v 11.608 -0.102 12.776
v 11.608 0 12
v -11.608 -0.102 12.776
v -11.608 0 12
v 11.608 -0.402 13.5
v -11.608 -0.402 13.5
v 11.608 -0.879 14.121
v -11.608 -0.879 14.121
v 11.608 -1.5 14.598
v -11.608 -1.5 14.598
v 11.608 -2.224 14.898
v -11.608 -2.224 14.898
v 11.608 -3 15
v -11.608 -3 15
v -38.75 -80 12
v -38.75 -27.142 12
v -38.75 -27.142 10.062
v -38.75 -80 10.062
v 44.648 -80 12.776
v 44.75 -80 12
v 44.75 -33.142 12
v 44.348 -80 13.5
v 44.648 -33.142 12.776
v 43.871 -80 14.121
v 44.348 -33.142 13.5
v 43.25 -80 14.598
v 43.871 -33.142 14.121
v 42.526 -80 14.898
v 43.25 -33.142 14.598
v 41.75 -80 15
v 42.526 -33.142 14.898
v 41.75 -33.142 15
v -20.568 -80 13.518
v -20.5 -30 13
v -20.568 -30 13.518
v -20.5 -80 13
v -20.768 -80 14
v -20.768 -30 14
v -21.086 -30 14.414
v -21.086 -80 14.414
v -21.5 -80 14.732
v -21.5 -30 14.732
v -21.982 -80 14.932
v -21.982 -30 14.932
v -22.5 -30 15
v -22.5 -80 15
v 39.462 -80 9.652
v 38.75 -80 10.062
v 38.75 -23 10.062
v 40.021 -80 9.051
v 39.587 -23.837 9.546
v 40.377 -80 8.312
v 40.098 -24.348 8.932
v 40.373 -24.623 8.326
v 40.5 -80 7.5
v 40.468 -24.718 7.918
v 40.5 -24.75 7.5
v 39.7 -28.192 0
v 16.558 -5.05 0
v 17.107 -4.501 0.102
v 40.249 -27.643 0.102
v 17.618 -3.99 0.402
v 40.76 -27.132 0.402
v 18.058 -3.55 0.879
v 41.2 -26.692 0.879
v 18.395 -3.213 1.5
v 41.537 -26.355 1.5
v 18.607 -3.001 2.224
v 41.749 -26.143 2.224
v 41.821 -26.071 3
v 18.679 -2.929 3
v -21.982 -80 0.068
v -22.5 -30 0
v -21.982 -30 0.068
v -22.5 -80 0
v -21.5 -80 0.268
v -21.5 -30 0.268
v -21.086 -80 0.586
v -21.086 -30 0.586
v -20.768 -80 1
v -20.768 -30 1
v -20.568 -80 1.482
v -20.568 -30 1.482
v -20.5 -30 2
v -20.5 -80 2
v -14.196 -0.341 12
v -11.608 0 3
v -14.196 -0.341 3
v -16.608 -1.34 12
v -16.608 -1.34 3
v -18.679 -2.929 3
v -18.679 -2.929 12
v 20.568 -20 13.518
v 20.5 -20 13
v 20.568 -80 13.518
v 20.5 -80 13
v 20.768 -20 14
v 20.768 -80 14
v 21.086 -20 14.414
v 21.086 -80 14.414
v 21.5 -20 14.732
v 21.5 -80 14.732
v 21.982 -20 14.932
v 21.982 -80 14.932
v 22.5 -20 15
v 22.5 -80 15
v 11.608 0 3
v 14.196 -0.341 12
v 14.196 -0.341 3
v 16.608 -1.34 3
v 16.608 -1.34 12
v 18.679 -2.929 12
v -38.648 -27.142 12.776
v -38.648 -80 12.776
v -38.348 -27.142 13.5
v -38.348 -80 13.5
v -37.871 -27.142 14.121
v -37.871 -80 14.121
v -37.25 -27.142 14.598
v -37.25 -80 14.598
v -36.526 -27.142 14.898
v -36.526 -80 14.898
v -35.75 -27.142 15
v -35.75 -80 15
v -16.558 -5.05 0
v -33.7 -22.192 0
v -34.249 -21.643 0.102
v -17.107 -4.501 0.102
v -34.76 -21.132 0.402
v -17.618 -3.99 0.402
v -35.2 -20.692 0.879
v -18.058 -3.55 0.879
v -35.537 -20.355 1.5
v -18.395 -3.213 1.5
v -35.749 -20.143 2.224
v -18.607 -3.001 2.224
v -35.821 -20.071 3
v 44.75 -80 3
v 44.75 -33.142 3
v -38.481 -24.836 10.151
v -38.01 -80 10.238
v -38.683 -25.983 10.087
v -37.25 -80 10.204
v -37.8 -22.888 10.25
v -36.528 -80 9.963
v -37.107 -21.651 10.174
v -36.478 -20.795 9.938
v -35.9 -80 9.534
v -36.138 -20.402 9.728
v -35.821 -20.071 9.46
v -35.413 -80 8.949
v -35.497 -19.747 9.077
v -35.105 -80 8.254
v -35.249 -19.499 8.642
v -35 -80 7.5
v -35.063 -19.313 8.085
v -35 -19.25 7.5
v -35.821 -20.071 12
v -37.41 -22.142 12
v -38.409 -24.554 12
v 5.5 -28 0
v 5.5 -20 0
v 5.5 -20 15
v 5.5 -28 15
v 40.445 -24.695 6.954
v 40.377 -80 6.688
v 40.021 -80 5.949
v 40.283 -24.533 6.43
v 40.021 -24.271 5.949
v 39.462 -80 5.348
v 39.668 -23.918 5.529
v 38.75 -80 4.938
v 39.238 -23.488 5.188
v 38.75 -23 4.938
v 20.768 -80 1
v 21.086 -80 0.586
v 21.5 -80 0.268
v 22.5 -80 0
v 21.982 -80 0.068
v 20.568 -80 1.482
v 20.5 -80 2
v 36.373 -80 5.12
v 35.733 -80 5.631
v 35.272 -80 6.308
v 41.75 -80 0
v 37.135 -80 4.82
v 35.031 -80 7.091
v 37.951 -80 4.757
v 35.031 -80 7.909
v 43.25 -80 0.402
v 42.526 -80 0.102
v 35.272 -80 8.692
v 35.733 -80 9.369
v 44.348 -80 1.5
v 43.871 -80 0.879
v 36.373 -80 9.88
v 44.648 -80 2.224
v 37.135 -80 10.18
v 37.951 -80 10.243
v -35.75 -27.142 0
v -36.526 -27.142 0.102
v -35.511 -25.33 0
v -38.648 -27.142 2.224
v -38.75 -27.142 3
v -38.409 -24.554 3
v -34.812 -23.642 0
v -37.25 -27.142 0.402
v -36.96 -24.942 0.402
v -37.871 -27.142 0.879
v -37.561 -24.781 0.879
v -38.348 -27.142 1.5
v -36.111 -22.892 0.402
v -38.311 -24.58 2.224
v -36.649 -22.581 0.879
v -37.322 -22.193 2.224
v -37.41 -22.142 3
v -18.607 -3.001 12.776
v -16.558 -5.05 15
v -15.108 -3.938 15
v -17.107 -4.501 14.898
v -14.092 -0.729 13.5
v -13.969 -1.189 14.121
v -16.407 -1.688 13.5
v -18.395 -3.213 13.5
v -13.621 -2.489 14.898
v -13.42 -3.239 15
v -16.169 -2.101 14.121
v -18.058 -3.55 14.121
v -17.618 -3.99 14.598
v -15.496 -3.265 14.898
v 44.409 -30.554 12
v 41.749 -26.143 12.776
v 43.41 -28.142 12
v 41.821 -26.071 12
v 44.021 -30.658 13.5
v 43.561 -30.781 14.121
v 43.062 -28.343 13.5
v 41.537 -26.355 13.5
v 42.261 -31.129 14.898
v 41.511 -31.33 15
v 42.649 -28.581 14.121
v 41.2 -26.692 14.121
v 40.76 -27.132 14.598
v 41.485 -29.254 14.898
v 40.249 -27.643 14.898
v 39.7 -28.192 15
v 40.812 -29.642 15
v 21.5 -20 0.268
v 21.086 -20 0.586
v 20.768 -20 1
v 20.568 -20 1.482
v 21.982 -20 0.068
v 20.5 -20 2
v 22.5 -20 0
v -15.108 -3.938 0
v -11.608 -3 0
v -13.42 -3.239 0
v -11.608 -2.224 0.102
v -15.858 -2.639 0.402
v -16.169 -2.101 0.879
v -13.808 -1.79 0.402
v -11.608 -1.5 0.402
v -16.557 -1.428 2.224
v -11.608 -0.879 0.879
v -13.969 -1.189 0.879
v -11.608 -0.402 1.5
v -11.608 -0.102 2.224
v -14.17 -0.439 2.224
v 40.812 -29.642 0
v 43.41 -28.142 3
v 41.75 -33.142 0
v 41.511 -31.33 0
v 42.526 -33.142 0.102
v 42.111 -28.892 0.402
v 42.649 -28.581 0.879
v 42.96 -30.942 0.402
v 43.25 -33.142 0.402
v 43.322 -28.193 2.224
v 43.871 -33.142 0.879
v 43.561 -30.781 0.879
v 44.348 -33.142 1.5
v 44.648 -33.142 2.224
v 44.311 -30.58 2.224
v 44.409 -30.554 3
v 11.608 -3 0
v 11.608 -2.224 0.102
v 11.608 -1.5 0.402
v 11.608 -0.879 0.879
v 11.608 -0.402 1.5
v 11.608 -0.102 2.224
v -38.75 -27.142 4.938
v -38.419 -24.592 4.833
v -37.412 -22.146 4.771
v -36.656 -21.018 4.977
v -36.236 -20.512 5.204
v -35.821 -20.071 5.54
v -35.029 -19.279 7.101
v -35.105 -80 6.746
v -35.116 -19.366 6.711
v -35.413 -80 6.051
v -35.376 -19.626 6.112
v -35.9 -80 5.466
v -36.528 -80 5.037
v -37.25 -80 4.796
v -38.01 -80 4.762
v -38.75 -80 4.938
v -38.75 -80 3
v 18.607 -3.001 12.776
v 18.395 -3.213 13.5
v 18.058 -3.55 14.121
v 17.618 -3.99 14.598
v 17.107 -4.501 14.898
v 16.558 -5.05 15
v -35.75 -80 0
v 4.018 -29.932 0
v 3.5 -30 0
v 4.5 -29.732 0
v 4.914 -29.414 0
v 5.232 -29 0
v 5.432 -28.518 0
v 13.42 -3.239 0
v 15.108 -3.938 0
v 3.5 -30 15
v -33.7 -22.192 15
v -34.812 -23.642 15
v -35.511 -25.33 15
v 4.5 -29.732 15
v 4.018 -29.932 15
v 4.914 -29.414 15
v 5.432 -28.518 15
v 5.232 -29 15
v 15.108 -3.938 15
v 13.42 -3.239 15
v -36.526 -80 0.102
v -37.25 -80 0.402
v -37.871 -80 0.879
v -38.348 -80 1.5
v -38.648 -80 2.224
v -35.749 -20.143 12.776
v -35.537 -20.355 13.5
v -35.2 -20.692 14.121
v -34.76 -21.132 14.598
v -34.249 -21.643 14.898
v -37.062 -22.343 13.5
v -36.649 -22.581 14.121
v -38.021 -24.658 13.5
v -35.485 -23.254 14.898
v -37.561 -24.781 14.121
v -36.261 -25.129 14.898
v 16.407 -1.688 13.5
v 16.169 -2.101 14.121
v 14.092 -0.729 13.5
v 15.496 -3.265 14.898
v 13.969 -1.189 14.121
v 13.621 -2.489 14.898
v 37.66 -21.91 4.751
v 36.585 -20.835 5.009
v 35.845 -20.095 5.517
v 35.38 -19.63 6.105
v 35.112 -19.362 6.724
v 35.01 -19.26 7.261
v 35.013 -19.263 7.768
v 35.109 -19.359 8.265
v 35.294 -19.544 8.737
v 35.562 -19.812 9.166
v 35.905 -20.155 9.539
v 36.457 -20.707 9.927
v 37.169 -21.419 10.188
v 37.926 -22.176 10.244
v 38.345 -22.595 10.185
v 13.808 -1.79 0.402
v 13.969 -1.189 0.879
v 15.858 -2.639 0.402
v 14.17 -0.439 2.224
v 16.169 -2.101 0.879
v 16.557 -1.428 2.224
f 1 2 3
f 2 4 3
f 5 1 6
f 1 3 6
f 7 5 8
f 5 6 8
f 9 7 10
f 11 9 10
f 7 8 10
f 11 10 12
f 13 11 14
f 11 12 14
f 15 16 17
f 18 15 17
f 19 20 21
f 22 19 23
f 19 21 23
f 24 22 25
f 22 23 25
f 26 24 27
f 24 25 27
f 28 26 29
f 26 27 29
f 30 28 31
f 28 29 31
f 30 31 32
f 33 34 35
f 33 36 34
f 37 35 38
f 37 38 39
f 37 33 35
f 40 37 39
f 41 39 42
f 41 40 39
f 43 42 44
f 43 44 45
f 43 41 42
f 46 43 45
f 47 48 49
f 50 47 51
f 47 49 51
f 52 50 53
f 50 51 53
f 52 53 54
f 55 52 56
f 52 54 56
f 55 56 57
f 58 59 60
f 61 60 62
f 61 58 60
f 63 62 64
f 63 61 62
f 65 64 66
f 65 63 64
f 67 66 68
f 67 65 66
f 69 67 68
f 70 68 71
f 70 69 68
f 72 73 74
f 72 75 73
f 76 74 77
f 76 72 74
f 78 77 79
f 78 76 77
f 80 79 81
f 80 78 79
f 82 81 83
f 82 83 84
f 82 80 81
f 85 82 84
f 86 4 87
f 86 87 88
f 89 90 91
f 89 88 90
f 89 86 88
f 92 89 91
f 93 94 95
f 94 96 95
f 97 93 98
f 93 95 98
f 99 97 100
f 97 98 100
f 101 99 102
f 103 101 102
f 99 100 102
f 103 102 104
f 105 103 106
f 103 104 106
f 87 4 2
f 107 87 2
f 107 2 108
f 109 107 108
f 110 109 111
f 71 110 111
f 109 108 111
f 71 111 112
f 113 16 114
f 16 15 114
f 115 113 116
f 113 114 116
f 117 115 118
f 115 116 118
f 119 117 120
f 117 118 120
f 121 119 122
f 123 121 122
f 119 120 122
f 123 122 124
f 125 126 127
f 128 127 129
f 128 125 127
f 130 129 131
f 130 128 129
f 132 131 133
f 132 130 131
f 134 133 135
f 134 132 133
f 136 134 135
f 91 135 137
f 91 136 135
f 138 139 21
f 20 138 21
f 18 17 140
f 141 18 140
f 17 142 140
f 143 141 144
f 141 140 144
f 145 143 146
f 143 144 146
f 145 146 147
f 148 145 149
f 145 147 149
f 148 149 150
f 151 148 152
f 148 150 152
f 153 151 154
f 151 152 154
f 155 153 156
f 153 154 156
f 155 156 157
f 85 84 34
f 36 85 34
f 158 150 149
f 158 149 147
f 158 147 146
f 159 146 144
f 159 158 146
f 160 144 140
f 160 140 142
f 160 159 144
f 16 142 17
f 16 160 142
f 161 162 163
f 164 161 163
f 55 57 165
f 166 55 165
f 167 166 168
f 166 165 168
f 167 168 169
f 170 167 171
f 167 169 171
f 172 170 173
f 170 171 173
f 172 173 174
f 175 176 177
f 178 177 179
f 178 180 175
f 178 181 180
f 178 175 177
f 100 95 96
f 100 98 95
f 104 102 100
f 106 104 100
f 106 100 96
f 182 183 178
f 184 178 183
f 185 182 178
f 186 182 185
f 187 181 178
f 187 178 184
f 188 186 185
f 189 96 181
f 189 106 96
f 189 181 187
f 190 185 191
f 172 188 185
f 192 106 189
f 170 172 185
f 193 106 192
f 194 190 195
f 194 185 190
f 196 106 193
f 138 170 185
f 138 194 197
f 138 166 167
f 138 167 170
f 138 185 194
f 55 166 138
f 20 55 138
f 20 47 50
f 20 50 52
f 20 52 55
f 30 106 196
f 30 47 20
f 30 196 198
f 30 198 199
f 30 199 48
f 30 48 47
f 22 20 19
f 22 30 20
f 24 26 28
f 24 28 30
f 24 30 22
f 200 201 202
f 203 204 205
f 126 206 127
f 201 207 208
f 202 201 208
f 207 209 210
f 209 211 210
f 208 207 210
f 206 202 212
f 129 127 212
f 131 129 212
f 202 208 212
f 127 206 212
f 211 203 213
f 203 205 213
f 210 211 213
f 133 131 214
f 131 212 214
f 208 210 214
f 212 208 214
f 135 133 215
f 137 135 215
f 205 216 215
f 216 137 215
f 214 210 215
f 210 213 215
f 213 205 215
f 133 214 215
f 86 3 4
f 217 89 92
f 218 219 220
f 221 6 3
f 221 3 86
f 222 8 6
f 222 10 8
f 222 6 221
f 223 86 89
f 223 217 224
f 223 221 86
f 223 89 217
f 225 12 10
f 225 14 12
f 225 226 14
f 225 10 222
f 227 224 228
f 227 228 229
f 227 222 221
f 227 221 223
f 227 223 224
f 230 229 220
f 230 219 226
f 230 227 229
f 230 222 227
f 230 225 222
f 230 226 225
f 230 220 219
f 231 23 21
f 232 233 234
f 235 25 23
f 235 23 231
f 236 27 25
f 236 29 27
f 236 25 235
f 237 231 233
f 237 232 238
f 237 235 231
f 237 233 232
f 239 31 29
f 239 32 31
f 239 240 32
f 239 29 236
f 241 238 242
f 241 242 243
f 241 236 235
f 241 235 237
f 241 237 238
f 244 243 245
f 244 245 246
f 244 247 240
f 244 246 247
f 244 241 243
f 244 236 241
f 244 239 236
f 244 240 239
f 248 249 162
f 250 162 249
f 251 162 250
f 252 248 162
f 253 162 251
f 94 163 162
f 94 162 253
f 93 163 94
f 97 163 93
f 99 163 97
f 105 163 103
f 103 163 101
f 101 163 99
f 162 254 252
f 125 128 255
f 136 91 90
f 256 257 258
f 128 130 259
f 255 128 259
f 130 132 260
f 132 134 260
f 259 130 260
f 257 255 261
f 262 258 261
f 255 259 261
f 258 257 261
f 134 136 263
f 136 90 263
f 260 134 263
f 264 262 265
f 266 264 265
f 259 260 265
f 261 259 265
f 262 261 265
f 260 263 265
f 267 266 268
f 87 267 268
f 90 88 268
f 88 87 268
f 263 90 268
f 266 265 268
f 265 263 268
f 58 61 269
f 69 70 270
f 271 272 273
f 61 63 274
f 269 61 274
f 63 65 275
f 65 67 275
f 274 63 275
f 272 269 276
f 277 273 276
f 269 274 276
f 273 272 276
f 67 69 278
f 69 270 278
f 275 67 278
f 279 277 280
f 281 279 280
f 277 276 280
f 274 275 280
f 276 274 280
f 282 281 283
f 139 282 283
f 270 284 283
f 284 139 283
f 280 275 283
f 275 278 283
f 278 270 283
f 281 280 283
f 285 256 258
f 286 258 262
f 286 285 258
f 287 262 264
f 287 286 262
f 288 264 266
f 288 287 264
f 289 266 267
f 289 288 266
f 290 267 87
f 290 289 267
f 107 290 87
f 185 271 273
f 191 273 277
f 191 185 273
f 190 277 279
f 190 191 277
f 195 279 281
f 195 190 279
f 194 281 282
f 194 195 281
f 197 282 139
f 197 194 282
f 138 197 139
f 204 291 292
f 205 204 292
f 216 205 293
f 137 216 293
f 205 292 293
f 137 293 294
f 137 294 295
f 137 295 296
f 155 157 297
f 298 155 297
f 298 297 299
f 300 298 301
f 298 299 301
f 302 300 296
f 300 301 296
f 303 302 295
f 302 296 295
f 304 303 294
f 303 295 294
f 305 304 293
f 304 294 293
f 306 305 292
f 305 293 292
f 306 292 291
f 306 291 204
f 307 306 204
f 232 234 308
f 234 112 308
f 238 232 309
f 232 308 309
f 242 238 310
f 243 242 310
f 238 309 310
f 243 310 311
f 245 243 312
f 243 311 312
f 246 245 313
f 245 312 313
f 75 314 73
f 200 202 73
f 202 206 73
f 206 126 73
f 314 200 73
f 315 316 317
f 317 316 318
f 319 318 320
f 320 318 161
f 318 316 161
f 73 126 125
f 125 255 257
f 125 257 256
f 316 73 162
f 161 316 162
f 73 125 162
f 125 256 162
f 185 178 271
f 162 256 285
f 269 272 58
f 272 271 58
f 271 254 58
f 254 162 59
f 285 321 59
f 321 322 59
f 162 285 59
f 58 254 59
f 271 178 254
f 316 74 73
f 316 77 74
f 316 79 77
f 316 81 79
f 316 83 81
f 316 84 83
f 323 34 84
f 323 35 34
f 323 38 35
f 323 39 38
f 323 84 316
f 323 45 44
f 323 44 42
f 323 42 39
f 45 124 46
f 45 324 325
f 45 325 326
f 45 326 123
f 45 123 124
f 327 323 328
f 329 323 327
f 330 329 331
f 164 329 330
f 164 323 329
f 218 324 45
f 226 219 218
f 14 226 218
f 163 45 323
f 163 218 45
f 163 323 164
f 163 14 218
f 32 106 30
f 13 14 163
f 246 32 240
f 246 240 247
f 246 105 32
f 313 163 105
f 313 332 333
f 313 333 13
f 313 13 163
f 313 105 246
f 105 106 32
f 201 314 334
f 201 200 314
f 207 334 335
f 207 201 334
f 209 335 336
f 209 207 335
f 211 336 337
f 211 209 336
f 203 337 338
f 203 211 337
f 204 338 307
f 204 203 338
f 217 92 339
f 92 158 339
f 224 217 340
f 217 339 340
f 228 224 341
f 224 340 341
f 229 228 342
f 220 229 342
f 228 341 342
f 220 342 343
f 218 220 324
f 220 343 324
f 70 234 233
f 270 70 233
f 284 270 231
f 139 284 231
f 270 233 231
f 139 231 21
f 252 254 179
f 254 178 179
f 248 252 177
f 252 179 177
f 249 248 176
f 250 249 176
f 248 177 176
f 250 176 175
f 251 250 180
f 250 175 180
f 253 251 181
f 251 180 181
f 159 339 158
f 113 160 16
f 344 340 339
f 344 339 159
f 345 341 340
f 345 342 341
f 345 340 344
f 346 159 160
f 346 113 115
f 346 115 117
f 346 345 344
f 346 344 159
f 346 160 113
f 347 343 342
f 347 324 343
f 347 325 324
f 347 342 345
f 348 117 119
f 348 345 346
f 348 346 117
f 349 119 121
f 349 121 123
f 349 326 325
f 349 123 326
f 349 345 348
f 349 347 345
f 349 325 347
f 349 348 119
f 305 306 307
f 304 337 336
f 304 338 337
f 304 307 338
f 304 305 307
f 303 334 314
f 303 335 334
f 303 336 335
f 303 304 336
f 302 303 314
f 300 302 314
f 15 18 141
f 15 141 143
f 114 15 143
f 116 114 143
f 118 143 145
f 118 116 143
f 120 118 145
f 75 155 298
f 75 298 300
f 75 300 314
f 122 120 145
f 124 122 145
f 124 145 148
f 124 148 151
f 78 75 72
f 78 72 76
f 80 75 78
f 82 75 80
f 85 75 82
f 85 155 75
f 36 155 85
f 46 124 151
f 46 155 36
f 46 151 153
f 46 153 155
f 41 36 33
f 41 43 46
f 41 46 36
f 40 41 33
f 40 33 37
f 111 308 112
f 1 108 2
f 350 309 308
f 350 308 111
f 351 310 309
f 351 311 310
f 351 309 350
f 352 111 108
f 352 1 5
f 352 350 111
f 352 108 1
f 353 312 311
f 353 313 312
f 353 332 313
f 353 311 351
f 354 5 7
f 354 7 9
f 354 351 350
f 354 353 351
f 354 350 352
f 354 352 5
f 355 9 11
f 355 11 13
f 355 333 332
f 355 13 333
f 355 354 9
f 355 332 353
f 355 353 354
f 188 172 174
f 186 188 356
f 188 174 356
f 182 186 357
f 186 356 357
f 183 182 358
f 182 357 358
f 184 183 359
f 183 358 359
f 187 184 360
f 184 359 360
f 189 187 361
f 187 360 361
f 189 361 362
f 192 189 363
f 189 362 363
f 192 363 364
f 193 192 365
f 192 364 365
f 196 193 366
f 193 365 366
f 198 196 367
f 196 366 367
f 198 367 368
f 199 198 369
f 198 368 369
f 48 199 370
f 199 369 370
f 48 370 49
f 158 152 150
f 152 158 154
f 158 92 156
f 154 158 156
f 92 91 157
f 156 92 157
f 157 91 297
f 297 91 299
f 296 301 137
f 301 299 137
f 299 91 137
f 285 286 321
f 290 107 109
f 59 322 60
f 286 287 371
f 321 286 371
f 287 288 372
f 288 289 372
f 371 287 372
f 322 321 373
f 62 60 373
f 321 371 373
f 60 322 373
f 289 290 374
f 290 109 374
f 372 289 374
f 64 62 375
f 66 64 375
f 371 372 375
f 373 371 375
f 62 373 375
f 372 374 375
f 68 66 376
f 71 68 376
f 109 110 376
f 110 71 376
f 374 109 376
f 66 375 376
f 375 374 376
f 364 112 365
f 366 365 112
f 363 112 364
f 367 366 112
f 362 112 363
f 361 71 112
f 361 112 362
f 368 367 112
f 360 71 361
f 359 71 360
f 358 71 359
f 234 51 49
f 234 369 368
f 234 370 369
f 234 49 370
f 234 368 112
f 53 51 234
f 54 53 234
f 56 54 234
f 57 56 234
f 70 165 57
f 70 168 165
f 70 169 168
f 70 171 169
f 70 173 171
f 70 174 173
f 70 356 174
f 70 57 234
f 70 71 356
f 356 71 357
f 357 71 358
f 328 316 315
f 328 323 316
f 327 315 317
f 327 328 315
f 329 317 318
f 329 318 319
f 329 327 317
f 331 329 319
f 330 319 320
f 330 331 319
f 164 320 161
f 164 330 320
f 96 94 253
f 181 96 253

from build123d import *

# Parameters (mm, degrees)
F1_DEPTH    = 80
F0_W        = 20.5
F0_H        = 15
F0_W_2      = 5.5
F2_DEPTH    = 30
F0_W_3      = 15
F3_DEPTH    = 20
F4_T1_DEPTH = 123.2356797549
F4_T3_DEPTH = 123.2356797549
F5_T1_DEPTH = 164.157613302
F6_R        = 10
F7_R        = 2
F8_R        = 3


# Not quite as in the source:
# - a fillet or chamfer that OpenCascade refuses, or shapes differently, is made with other operations: its cross-section is extruded or revolved along the edge and cut away or added


with BuildPart() as f1:
    # F0 (on Front) → F1 (new body)
    with BuildSketch(Plane.XZ):
        with BuildLine():
            Line((-20.5, 15), (-38.75, 15))
            Line((-38.75, 15), (-38.75, 10.0617376915))
            ThreePointArc((-38.75, 10.0617376915), (-36.1987907943, 9.7707377656), (-35, 7.5))
            ThreePointArc((-35, 7.5), (-36.1987907943, 5.2292622344), (-38.75, 4.9382623085))
            Line((-38.75, 4.9382623085), (-38.75, 0))
            Line((-38.75, 0), (-20.5, 0))
            Line((-20.5, 0), (-20.5, 15))
        make_face()
    extrude(amount=F1_DEPTH)

    # F0 (on Front) → F2 (join)
    with BuildSketch(Plane.XZ):
        with Locations((-10.25, 7.5)):
            Rectangle(F0_W, F0_H)
        with Locations((2.75, 7.5)):
            Rectangle(F0_W_2, F0_H)
    extrude(amount=F2_DEPTH)



with BuildPart() as f1b:
    # F0 (on Front) → F1, piece 2 (new body)
    with BuildSketch(Plane.XZ):
        with BuildLine():
            Line((38.75, 15), (20.5, 15))
            Line((20.5, 15), (20.5, 0))
            Line((20.5, 0), (38.75, 0))
            Line((38.75, 0), (38.75, 4.9382623085))
            ThreePointArc((38.75, 4.9382623085), (35, 7.5), (38.75, 10.0617376915))
            Line((38.75, 10.0617376915), (38.75, 15))
        make_face()
        with BuildLine():
            Line((44.75, 15), (38.75, 15))
            Line((38.75, 15), (38.75, 10.0617376915))
            ThreePointArc((38.75, 10.0617376915), (40.0207377656, 9.0512092057), (40.5, 7.5))
            ThreePointArc((40.5, 7.5), (40.0207377656, 5.9487907943), (38.75, 4.9382623085))
            Line((38.75, 4.9382623085), (38.75, 0))
            Line((38.75, 0), (44.75, 0))
            Line((44.75, 0), (44.75, 15))
        make_face()
    extrude(amount=F1_DEPTH)


with BuildPart() as f1_1:
    add(f1.part)

    add(f1b.part)  # F3 merges F1b
    # F0 (on Front) → F3 (join)
    with BuildSketch(Plane.XZ):
        with Locations((13, 7.5)):
            Rectangle(F0_W_3, F0_H)
    extrude(amount=F3_DEPTH)

    # F4: chamfer of 23 on 2 edges, made by hand

    # F4_s2 → F4_t1 (cut)
    with BuildSketch(Plane.XY.offset(-59.1487087232)):
        Polygon((-15.75, 0), (-38.75, -23), (-38.75, 0), align=None)
    extrude(amount=F4_T1_DEPTH, mode=Mode.SUBTRACT)

    # F4_s4 → F4_t3 (cut)
    with BuildSketch(Plane.XY.offset(-49.0869710317)):
        Polygon((-15.75, 0), (-38.75, -23), (-38.75, 0), align=None)
    extrude(amount=F4_T3_DEPTH, mode=Mode.SUBTRACT)

    # F5: chamfer of 29 on 1 edges, made by hand

    # F5_s2 → F5_t1 (cut)
    with BuildSketch(Plane.XY.offset(-74.578806651)):
        Polygon((15.75, 0), (44.75, -29), (44.75, 0), align=None)
    extrude(amount=F5_T1_DEPTH, mode=Mode.SUBTRACT)

    # F6
    f6_edges = [f1_1.edges().sort_by_distance(p)[0] for p in [
        (15.75, 0, 7.5),
        (-15.75, 0, 7.5),
        (44.75, -29, 7.5),
        (-38.75, -23, 2.469131),
        (-38.75, -23, 12.530869),
    ]]
    fillet(f6_edges, radius=F6_R)

    # F7
    f7_edges = [f1_1.edges().sort_by_distance(p)[0] for p in [
        (20.5, -50, 15),
        (20.5, -50, 0),
        (-20.5, -55, 15),
        (-20.5, -55, 0),
        (5.5, -30, 7.5),
    ]]
    fillet(f7_edges, radius=F7_R)

    # F8
    f8_edges = [f1_1.edges().sort_by_distance(p)[0] for p in [
        (-38.75, -53.571068, 15),
        (-37.988795, -23.315301, 15),
        (-27.25, -11.5, 15),
        (-15.434699, -0.761205, 15),
        (0, 0, 15),
        (15.434699, -0.761205, 15),
        (30.25, -14.5, 15),
        (43.988795, -29.315301, 15),
        (44.75, -56.571068, 15),
        (44.75, -56.571068, 0),
        (43.988795, -29.315301, 0),
        (-38.75, -53.571068, 0),
        (-37.988795, -23.315301, 0),
        (-27.25, -11.5, 0),
        (-15.434699, -0.761205, 0),
        (0, 0, 0),
        (15.434699, -0.761205, 0),
        (30.25, -14.5, 0),
    ]]
    fillet(f8_edges, radius=F8_R)


solid = f1_1.part
